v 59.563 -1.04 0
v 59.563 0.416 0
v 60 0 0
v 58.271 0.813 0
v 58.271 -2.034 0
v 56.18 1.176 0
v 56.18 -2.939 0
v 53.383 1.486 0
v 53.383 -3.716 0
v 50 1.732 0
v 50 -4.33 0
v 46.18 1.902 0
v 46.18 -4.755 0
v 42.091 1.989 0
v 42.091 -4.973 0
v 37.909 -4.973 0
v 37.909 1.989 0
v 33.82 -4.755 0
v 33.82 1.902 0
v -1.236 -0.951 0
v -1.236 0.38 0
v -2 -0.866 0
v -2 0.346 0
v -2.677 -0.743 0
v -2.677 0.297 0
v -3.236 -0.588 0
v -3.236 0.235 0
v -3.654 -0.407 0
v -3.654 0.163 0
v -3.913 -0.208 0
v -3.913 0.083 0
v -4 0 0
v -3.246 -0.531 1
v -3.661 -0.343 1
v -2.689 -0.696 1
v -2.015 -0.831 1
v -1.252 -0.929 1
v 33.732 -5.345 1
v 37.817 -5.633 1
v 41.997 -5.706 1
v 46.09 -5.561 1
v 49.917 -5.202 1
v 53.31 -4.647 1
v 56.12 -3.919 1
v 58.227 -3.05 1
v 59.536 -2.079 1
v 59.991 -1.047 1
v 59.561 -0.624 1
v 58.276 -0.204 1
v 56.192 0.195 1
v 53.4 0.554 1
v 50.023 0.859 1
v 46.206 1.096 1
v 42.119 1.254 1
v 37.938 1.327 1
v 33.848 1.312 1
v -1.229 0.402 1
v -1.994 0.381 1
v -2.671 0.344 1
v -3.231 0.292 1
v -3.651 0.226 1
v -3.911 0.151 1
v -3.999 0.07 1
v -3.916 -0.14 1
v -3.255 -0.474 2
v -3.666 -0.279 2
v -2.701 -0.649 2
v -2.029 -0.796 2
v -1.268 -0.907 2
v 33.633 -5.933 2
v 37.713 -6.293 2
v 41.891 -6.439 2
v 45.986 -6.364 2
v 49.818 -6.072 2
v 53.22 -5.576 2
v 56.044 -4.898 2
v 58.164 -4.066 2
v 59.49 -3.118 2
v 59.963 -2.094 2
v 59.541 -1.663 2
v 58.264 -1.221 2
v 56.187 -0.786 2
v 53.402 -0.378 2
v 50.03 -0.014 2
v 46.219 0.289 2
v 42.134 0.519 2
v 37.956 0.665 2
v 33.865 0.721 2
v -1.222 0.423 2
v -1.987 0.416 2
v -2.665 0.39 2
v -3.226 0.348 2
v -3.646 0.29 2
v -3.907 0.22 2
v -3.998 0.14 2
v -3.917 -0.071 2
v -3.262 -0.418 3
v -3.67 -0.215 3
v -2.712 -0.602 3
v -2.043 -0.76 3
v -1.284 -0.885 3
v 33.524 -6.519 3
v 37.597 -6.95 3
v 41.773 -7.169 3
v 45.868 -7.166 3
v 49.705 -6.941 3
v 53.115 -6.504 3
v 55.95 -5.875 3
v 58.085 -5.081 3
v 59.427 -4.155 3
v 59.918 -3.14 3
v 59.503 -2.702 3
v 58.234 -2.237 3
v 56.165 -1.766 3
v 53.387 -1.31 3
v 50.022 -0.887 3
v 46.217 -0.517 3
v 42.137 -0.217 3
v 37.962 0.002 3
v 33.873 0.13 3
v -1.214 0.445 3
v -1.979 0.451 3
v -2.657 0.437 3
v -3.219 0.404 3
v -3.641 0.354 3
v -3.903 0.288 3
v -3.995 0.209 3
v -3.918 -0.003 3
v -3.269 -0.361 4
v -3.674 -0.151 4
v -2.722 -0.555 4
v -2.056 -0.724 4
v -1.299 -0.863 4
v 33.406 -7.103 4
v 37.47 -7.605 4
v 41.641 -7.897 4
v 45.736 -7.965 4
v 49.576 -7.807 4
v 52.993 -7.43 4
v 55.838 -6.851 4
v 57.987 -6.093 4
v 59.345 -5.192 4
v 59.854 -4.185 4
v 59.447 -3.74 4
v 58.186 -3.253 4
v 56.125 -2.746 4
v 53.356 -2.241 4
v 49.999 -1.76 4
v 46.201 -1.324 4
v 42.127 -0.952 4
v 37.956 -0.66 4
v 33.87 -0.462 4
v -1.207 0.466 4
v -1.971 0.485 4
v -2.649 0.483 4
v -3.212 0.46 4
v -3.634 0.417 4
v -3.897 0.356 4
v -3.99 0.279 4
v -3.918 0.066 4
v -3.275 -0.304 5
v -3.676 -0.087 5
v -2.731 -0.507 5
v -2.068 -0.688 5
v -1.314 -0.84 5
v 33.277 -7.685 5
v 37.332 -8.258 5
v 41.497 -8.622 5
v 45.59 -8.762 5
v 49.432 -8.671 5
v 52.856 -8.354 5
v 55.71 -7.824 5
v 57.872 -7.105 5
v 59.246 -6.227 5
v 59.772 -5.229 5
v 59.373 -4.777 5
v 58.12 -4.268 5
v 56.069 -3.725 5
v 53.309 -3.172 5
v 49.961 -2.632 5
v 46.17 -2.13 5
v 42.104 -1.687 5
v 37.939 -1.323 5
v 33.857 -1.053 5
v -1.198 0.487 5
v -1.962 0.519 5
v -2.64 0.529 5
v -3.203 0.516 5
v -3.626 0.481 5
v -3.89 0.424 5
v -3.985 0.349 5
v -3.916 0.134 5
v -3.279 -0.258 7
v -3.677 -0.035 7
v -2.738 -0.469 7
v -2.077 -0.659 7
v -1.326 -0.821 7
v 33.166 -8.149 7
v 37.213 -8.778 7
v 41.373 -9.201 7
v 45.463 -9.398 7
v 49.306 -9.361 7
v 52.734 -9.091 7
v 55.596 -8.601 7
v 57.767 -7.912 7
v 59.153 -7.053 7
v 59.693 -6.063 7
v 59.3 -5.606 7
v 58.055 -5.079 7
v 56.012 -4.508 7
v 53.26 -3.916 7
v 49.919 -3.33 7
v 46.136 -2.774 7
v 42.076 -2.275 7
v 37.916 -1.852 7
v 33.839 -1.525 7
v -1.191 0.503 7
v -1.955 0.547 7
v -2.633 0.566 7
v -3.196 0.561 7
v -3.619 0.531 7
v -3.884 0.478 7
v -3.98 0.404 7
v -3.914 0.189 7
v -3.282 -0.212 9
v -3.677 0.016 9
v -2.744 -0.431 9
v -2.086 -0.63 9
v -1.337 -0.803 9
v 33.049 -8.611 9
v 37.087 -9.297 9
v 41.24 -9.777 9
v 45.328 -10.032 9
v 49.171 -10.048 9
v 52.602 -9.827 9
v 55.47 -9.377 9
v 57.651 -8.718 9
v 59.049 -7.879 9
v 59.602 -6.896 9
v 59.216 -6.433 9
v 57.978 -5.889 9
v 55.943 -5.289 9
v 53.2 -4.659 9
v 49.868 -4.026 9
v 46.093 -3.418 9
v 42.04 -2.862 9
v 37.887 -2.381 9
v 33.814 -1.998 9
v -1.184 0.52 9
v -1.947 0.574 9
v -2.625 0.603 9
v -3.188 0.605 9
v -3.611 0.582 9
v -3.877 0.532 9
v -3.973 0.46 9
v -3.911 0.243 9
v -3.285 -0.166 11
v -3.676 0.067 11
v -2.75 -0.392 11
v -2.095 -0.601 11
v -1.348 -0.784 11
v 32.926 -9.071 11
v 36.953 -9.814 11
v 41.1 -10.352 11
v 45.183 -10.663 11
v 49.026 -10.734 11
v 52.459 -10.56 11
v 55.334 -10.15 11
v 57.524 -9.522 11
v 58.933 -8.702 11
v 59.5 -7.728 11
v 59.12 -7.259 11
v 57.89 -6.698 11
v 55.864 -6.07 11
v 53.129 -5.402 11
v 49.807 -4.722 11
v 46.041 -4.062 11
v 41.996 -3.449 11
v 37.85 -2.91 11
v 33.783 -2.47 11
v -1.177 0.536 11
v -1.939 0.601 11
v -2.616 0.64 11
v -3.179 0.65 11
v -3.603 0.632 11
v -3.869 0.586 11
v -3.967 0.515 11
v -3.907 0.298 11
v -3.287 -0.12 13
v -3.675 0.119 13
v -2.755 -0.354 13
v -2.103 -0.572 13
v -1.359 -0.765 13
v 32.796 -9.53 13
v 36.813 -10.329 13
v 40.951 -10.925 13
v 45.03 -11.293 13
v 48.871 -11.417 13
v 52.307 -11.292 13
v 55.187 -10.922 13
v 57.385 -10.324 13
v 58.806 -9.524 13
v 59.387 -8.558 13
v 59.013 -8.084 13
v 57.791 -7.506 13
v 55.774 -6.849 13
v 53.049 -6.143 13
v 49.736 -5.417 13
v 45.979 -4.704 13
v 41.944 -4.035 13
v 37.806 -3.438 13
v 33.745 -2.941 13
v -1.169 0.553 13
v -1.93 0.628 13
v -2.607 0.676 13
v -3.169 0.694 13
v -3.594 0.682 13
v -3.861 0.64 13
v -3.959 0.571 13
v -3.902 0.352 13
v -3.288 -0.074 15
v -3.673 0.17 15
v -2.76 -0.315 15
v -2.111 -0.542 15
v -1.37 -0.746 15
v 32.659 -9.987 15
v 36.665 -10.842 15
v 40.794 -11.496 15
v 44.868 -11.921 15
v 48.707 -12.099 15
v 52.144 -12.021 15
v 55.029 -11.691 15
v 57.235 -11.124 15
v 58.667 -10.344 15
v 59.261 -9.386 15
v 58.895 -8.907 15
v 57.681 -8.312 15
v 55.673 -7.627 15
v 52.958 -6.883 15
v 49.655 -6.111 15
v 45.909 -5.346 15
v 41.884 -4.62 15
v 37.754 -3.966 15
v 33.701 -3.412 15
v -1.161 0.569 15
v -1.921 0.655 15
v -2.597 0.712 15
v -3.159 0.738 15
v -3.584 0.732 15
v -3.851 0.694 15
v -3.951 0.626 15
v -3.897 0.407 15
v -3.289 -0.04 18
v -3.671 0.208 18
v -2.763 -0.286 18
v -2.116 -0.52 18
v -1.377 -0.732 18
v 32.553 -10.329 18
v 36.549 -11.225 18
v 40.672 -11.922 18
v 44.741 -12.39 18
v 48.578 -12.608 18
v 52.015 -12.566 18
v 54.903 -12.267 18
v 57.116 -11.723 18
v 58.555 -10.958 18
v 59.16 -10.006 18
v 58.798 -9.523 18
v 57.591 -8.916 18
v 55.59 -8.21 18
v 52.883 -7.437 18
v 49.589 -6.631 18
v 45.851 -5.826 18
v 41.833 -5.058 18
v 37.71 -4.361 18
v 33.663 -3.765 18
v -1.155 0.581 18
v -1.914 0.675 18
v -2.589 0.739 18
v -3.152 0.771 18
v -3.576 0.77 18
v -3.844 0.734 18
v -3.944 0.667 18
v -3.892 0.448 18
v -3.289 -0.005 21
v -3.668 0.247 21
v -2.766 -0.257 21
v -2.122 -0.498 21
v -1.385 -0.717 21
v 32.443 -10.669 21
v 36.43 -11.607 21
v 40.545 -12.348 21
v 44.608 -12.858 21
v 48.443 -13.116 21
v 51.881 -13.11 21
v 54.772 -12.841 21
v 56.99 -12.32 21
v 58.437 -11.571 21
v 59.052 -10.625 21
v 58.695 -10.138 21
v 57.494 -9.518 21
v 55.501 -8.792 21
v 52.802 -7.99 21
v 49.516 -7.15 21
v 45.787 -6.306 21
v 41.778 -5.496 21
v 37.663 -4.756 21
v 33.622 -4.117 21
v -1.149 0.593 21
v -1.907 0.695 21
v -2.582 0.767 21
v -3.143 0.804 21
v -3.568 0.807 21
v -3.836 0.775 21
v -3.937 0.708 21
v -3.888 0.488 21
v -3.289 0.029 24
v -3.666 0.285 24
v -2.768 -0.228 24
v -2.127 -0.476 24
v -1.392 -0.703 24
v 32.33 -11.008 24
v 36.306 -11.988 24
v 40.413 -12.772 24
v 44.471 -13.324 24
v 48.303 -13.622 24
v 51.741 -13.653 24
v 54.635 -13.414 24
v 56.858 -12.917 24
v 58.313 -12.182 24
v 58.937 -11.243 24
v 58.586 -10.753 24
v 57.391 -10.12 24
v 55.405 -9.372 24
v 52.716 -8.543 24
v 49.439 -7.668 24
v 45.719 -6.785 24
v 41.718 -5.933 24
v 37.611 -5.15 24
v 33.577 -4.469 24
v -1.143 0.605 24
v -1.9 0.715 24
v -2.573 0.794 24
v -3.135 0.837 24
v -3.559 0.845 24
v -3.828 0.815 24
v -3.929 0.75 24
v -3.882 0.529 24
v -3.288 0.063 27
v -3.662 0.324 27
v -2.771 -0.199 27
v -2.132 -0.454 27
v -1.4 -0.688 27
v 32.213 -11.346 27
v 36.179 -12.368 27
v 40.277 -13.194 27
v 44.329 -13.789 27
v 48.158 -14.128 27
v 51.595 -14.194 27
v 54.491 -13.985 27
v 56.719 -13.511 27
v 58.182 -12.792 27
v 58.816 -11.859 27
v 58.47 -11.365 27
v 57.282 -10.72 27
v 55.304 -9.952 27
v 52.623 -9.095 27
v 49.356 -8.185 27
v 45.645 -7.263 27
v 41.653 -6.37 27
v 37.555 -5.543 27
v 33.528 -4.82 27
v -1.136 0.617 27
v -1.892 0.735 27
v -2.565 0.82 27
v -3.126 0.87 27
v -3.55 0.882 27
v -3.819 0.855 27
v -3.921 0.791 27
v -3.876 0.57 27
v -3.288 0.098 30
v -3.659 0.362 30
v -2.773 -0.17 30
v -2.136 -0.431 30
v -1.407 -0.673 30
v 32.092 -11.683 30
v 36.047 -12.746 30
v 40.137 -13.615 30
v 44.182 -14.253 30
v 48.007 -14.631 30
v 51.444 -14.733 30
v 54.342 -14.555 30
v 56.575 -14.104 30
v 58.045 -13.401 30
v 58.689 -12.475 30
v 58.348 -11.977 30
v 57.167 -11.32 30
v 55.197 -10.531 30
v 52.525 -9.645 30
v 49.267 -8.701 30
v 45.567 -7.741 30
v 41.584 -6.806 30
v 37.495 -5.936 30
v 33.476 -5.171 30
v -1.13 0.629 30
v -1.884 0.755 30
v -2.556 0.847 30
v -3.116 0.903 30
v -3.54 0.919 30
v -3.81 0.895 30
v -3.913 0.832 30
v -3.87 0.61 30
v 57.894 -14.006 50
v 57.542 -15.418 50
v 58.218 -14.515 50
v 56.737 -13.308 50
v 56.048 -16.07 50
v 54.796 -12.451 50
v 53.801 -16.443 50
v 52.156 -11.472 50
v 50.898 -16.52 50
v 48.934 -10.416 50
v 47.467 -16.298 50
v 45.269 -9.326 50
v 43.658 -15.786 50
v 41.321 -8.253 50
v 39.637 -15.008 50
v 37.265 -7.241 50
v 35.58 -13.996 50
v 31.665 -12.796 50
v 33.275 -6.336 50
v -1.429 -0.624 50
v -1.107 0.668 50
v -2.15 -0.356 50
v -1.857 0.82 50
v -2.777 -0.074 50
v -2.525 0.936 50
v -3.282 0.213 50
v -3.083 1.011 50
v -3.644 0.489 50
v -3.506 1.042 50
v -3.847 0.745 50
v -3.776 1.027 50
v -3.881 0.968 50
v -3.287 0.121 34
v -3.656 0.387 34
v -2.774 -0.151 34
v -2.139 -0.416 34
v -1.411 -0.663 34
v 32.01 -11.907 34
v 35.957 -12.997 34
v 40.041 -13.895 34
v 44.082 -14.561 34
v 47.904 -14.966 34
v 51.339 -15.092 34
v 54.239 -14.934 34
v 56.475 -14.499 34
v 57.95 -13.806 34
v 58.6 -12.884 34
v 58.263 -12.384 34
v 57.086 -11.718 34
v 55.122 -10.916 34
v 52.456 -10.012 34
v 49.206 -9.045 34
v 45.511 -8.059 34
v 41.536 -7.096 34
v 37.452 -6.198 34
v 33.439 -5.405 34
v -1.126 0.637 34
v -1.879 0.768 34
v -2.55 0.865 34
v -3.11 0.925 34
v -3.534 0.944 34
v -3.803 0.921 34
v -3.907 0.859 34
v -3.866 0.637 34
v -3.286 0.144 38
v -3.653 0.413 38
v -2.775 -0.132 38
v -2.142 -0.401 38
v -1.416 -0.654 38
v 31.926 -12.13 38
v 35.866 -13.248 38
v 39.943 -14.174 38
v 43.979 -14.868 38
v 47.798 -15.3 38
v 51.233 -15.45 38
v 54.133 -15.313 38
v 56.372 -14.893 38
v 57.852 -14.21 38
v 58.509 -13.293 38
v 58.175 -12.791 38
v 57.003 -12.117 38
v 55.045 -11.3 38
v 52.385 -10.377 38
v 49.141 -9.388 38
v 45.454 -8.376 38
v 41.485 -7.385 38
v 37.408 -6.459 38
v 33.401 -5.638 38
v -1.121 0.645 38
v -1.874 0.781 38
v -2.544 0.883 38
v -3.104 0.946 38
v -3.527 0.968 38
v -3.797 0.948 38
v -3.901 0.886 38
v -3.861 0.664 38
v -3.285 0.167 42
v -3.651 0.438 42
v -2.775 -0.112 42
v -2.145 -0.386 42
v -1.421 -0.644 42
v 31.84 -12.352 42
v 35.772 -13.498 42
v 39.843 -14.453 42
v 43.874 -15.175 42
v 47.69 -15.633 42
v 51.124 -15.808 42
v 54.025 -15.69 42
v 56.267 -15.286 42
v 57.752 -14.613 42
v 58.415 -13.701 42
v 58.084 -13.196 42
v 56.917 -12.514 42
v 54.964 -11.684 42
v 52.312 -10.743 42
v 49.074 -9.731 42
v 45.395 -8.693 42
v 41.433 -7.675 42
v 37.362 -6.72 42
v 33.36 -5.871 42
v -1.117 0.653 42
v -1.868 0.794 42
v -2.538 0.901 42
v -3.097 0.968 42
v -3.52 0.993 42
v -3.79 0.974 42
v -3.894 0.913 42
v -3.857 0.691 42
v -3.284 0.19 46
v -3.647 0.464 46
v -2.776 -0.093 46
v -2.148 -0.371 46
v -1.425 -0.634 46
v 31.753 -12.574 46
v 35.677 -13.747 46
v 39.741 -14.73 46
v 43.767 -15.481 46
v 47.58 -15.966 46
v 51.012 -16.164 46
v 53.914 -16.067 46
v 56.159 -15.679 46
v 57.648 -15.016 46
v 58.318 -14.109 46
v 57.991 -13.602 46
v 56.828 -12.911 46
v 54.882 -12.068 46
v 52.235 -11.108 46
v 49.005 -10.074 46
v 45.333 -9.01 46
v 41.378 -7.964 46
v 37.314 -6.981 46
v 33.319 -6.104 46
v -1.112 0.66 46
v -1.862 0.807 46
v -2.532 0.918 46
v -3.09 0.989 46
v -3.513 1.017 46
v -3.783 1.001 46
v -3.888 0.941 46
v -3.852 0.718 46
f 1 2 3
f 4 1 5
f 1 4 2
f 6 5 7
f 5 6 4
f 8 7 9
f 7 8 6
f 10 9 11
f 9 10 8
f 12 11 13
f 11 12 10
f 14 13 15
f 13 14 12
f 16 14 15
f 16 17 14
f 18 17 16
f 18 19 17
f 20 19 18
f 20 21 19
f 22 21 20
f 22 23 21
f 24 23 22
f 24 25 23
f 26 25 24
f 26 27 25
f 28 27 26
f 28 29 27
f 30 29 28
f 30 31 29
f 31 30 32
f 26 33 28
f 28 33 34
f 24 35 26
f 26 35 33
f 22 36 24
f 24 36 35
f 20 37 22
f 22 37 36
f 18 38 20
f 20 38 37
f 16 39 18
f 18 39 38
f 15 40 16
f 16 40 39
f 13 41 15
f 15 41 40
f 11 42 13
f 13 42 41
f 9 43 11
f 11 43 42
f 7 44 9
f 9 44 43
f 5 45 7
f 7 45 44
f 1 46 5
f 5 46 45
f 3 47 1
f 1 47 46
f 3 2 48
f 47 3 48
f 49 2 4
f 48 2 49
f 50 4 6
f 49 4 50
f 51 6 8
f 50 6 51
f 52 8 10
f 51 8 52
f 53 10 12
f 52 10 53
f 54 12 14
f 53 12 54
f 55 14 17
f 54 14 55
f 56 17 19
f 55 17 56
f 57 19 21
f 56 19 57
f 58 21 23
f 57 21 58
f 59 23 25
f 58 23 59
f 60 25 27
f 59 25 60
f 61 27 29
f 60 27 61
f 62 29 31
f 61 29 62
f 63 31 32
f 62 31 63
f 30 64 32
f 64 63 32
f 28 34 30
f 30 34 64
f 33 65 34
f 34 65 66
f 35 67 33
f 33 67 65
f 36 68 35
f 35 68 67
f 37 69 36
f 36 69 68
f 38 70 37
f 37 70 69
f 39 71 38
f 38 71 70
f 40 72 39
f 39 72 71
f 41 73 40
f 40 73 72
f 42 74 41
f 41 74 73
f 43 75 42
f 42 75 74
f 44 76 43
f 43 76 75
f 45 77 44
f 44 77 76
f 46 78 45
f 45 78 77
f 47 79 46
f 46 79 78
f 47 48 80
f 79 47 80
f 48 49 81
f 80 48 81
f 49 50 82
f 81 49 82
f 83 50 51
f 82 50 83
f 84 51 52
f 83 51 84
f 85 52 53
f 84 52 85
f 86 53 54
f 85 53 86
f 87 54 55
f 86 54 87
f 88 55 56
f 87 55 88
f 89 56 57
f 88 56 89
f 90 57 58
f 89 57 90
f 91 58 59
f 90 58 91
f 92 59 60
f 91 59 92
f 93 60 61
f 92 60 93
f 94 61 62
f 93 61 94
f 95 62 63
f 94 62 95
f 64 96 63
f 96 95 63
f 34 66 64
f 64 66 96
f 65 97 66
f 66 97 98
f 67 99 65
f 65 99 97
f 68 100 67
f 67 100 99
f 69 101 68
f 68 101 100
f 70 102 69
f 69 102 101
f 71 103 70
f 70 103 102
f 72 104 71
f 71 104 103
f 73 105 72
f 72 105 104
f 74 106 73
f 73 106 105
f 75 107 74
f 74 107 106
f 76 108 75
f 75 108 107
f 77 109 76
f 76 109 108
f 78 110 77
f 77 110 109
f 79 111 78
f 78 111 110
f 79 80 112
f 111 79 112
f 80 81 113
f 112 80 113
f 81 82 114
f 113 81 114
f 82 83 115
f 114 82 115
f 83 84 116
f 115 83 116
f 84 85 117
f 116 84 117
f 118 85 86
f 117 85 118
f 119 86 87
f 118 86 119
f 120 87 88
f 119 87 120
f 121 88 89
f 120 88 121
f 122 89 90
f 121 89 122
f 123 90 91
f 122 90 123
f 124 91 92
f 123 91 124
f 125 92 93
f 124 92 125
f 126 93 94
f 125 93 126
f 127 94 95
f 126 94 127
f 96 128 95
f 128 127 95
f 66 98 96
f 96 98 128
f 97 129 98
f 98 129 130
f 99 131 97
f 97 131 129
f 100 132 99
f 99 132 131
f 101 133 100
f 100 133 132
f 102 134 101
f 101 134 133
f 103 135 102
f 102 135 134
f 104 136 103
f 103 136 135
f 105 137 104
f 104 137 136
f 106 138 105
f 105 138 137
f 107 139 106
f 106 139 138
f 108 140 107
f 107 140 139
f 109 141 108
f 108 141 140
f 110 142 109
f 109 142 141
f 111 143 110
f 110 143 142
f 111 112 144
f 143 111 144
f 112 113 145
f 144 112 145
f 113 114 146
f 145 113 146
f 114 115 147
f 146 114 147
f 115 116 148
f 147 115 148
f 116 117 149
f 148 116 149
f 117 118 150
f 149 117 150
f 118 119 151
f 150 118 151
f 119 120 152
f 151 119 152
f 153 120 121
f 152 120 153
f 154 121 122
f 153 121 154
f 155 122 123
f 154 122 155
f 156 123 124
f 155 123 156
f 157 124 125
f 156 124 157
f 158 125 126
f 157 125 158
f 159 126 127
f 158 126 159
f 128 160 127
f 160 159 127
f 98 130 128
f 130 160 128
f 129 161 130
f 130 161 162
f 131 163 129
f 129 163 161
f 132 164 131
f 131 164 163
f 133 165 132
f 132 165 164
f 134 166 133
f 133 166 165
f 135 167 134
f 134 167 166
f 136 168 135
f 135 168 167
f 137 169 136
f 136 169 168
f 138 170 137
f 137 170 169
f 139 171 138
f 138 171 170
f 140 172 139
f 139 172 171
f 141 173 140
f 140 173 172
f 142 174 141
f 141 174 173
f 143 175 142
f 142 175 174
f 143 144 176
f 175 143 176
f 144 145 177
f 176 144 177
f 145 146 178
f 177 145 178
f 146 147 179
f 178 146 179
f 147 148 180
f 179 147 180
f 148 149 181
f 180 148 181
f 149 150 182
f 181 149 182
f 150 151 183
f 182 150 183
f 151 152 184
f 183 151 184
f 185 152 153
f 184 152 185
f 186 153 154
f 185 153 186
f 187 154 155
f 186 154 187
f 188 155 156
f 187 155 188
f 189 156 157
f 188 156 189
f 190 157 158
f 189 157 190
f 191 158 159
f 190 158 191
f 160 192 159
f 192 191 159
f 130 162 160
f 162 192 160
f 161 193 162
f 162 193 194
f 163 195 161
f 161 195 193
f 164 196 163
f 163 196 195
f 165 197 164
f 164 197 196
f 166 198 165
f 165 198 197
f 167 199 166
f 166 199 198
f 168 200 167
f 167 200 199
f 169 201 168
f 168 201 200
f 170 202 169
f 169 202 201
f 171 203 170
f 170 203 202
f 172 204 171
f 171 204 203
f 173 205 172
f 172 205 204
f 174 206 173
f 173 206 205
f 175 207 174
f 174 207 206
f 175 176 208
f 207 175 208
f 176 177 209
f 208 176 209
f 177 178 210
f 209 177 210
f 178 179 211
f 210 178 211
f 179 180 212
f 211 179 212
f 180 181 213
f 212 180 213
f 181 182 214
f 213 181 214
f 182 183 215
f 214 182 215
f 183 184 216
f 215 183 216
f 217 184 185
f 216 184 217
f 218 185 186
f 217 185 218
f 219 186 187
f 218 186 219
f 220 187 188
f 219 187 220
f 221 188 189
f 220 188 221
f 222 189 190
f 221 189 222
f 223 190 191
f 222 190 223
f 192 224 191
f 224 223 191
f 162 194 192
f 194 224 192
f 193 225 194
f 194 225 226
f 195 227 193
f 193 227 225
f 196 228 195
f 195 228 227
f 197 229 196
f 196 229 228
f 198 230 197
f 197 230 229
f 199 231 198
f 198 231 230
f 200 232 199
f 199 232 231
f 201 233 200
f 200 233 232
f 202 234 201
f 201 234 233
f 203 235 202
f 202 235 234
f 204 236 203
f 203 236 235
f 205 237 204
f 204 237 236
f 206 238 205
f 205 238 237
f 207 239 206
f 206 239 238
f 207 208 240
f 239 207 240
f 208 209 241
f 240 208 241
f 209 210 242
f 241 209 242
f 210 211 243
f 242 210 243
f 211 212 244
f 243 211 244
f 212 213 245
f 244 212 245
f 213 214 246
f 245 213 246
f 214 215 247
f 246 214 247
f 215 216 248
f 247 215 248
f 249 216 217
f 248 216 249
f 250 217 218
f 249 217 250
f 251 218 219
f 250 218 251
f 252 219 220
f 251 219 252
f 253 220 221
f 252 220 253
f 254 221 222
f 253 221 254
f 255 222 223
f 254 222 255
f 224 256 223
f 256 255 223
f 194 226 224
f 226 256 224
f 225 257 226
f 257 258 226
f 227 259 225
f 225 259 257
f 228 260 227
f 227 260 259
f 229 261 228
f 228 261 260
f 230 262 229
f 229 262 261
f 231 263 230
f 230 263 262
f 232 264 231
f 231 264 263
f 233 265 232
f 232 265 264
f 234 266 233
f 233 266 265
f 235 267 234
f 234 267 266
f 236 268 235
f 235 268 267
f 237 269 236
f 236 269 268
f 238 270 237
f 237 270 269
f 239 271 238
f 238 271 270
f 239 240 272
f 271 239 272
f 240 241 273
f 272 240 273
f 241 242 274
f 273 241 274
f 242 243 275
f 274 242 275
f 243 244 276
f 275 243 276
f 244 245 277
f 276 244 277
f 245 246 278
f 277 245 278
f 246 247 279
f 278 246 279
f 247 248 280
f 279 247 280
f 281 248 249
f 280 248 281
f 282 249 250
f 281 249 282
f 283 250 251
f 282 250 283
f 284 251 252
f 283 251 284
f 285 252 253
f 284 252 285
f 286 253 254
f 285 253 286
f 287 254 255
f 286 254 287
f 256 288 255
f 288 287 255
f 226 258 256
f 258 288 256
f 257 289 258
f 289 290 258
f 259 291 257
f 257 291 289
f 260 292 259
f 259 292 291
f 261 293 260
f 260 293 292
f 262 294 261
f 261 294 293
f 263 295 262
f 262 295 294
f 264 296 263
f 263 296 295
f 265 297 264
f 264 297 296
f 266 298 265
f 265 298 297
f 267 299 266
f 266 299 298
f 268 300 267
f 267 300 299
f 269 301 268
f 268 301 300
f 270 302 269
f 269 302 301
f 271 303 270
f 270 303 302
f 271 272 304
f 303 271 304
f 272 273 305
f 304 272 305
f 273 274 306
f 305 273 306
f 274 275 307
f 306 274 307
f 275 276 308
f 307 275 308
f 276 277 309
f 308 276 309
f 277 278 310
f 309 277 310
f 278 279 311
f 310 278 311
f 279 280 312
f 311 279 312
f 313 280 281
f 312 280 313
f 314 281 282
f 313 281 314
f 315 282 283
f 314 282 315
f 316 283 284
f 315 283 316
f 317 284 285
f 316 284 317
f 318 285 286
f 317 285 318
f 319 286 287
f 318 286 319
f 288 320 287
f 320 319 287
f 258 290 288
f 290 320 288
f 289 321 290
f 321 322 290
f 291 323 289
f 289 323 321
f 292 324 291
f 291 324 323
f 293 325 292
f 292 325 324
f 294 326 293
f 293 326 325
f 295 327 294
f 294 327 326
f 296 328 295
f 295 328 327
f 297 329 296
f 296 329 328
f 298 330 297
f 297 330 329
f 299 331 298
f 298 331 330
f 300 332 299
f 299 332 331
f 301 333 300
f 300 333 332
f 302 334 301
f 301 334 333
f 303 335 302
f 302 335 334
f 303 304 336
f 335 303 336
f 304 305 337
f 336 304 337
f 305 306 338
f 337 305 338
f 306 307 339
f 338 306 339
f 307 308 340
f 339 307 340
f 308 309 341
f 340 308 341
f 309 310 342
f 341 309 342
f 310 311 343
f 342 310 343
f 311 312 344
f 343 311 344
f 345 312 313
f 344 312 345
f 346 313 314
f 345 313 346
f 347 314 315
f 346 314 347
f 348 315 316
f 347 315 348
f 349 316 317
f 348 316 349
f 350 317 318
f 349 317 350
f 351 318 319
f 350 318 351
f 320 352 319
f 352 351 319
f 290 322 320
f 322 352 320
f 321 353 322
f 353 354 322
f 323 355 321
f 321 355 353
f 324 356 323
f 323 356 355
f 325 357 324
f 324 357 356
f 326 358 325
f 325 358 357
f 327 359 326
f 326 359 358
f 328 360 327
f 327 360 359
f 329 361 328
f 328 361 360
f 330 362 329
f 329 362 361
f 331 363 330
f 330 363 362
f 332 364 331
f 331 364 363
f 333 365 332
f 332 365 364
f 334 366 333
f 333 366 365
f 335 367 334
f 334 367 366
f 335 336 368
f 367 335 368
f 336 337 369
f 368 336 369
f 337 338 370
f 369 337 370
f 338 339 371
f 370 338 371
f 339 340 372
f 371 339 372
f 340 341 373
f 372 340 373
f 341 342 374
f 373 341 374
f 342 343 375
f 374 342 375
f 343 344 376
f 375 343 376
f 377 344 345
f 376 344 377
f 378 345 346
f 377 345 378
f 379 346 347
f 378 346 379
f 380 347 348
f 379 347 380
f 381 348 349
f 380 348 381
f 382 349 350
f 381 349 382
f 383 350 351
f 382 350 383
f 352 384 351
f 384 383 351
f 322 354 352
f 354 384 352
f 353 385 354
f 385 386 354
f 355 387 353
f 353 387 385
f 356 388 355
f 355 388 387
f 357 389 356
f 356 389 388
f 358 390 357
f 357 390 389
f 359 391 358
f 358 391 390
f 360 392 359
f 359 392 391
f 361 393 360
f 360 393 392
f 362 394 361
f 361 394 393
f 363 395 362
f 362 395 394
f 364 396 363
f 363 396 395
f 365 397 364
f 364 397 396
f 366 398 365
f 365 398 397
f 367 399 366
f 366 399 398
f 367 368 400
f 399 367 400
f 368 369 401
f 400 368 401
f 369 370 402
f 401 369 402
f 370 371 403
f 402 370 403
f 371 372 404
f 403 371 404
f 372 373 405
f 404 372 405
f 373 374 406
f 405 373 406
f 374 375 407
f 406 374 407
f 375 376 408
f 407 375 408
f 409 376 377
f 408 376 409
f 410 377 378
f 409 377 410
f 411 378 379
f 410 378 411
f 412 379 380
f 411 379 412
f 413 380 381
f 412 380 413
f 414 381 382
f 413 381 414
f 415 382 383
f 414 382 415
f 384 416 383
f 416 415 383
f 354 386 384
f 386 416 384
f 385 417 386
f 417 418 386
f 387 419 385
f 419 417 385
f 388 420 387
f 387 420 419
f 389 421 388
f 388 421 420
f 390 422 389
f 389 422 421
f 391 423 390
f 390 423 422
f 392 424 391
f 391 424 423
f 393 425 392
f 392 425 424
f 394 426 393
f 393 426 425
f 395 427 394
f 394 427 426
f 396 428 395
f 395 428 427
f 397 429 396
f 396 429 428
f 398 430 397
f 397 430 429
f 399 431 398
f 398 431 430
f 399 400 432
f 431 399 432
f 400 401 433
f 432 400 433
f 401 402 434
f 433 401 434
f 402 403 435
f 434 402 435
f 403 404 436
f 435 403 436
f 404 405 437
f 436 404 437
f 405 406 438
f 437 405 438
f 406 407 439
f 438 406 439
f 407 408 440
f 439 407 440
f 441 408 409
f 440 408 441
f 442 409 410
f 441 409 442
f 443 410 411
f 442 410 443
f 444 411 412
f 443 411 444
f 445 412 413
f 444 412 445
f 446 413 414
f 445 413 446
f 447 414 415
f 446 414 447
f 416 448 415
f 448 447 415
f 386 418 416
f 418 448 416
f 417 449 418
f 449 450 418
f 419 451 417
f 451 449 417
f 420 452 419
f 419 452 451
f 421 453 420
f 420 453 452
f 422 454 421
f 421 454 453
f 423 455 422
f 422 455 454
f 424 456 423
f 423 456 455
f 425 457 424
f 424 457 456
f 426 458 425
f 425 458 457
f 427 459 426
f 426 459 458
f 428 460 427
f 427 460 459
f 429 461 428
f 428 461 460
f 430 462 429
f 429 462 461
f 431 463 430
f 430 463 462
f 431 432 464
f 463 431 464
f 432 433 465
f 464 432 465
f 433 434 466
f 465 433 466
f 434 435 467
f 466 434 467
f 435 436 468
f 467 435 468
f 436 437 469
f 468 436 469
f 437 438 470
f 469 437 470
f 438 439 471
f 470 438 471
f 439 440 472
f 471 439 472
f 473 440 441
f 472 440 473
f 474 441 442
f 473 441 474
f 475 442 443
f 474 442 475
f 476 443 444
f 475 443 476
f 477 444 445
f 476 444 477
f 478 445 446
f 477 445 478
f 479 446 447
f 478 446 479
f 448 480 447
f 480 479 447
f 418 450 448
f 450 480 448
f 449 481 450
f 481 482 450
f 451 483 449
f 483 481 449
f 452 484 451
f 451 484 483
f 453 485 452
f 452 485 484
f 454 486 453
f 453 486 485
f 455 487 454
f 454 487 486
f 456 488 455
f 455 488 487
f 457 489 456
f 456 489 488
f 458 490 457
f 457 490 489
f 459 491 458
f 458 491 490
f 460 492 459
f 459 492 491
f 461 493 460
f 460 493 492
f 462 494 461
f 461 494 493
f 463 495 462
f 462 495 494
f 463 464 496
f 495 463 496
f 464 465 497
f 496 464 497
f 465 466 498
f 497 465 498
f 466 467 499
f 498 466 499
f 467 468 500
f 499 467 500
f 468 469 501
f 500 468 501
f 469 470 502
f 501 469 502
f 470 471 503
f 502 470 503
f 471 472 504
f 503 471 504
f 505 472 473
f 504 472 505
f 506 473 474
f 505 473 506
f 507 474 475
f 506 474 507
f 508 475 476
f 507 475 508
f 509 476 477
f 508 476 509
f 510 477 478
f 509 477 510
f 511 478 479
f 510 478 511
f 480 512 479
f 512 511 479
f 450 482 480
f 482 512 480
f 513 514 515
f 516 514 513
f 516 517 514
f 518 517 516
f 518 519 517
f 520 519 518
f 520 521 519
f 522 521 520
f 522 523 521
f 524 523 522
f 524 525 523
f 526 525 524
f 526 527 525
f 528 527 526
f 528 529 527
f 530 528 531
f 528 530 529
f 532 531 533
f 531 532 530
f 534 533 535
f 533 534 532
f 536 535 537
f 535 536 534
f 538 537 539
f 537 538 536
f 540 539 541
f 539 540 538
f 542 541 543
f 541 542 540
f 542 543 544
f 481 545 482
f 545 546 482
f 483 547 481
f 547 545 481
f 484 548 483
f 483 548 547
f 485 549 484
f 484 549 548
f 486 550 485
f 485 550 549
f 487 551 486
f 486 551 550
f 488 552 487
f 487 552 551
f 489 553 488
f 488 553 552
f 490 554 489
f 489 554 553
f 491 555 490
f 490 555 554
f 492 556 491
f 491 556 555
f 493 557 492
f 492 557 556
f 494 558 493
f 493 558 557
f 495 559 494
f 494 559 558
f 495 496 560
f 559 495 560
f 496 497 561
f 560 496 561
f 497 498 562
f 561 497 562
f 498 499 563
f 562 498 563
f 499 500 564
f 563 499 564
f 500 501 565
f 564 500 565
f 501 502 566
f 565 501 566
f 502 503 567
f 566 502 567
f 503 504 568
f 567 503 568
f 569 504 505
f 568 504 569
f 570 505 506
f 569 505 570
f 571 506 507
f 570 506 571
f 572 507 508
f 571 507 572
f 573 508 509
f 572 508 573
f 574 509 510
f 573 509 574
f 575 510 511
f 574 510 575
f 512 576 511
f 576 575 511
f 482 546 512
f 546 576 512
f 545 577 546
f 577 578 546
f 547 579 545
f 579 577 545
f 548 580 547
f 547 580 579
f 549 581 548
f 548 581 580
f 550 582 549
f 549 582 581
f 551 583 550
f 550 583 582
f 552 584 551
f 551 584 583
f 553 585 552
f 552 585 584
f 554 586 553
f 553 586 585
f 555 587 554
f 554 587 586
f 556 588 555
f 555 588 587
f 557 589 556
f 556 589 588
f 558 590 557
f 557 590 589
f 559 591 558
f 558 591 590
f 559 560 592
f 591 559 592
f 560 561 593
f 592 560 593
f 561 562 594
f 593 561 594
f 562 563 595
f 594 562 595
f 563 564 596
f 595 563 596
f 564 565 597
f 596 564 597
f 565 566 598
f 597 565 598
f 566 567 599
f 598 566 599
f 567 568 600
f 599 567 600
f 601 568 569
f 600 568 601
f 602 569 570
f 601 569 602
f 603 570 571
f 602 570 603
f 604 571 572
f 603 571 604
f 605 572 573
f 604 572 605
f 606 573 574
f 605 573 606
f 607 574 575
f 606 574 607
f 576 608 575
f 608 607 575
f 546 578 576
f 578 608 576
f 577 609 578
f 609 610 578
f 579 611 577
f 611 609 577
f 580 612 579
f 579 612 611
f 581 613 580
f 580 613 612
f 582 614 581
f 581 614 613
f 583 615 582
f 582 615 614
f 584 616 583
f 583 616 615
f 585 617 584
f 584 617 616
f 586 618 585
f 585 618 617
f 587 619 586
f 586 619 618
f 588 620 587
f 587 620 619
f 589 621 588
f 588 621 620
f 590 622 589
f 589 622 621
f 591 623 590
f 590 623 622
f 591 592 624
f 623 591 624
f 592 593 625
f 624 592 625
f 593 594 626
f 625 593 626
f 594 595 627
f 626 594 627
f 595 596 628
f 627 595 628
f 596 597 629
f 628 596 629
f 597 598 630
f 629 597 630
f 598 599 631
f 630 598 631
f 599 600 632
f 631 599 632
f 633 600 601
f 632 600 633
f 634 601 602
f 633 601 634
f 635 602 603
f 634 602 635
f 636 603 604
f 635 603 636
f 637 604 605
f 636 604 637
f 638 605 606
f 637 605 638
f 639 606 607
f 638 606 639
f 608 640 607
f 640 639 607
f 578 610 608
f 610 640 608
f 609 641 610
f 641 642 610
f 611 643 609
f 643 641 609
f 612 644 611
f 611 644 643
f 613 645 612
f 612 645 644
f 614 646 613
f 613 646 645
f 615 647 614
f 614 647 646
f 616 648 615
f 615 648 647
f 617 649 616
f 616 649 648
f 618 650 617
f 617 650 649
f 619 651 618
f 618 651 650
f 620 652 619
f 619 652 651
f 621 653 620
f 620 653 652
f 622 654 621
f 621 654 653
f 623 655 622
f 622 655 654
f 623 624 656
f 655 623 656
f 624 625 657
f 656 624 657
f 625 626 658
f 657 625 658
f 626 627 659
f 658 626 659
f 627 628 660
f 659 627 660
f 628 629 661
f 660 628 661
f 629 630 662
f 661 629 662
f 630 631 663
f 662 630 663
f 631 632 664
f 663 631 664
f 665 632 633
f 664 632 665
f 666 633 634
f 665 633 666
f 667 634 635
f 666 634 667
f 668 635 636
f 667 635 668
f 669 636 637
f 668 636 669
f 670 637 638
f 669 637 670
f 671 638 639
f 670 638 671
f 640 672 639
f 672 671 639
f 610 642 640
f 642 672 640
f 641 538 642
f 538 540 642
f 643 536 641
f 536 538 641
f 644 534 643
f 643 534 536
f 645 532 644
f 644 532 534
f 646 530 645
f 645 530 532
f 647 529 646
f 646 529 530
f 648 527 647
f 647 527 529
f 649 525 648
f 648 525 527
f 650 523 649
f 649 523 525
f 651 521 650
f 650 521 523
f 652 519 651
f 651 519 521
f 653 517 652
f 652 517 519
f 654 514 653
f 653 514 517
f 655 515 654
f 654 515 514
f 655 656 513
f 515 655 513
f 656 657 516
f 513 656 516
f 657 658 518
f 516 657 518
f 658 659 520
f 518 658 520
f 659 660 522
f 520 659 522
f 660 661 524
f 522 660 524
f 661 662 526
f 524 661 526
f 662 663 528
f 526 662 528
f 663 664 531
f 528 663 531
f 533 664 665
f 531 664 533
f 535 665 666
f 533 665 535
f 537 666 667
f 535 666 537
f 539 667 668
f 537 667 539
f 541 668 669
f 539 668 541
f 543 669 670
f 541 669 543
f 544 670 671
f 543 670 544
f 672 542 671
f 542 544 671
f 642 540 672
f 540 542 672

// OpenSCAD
/*
for (i = [0:10]) {
    translate([0,0,10*i]) linear_extrude(10,twist = 5*exp(-0.1*i)) scale([1,1]) hull() {
        circle(r=3);
        translate([40,0,0]) circle(r=10);
    }
}*/

module shape() {
        difference() {
            hull() {
            scale([2,.2])circle(r = 2);
            translate([40,0,0]) scale([2,.2])circle(r=10);
        }
        translate([-20,-100,0])square([100,100]);
    }

    difference() {
            hull() {
            scale([2,.5])circle(r = 2);
            translate([40,0,0]) scale([2,.5])circle(r=10);
        }
        translate([-20,0,0])square([100,100]);
    }
}

//translate([0,0,10]) shape();

module element(z=10, t = 5) {
    
    linear_extrude(z,twist=t, $fn=30,slices=5) shape();
}

module element2(z = 10) {
    linear_extrude(z) {
            difference() {
                hull() {
                scale([2,.2])circle(r = 2);
                translate([40,0,0]) scale([2,.2])circle(r=10);
            }
            translate([-20,-100,0])square([100,100]);
        }

        difference() {
                hull() {
                scale([2,.5])circle(r = 2);
                translate([40,0,0]) scale([2,.5])circle(r=10);
            }
            translate([-20,0,0])square([100,100]);
        }
    }    
}

/*translate([0,0,z]) rotate([0,0,-r]) element(z=5,t=5);
translate([0,0,5]) rotate([0,0,-5]) element(z=10,t=5);
translate([0,0,15]) rotate([0,0,-10]) element(z=20,t=5);
*/

z=[5,10,15,20];
t=[5,4,3,2];
t_acc = [0,5,9,12];

//echo(t_acc);
z_acc = [0,5,15,30];
for (i = [0:1:3]) {
    translate([0,0,z_acc[i]]) rotate([0,0,-t_acc[i]]) element(z=z[i],t=t[i]);
    //z_acc = z_acc + z[i];
    //t_acc = t_acc+t[i];
}
